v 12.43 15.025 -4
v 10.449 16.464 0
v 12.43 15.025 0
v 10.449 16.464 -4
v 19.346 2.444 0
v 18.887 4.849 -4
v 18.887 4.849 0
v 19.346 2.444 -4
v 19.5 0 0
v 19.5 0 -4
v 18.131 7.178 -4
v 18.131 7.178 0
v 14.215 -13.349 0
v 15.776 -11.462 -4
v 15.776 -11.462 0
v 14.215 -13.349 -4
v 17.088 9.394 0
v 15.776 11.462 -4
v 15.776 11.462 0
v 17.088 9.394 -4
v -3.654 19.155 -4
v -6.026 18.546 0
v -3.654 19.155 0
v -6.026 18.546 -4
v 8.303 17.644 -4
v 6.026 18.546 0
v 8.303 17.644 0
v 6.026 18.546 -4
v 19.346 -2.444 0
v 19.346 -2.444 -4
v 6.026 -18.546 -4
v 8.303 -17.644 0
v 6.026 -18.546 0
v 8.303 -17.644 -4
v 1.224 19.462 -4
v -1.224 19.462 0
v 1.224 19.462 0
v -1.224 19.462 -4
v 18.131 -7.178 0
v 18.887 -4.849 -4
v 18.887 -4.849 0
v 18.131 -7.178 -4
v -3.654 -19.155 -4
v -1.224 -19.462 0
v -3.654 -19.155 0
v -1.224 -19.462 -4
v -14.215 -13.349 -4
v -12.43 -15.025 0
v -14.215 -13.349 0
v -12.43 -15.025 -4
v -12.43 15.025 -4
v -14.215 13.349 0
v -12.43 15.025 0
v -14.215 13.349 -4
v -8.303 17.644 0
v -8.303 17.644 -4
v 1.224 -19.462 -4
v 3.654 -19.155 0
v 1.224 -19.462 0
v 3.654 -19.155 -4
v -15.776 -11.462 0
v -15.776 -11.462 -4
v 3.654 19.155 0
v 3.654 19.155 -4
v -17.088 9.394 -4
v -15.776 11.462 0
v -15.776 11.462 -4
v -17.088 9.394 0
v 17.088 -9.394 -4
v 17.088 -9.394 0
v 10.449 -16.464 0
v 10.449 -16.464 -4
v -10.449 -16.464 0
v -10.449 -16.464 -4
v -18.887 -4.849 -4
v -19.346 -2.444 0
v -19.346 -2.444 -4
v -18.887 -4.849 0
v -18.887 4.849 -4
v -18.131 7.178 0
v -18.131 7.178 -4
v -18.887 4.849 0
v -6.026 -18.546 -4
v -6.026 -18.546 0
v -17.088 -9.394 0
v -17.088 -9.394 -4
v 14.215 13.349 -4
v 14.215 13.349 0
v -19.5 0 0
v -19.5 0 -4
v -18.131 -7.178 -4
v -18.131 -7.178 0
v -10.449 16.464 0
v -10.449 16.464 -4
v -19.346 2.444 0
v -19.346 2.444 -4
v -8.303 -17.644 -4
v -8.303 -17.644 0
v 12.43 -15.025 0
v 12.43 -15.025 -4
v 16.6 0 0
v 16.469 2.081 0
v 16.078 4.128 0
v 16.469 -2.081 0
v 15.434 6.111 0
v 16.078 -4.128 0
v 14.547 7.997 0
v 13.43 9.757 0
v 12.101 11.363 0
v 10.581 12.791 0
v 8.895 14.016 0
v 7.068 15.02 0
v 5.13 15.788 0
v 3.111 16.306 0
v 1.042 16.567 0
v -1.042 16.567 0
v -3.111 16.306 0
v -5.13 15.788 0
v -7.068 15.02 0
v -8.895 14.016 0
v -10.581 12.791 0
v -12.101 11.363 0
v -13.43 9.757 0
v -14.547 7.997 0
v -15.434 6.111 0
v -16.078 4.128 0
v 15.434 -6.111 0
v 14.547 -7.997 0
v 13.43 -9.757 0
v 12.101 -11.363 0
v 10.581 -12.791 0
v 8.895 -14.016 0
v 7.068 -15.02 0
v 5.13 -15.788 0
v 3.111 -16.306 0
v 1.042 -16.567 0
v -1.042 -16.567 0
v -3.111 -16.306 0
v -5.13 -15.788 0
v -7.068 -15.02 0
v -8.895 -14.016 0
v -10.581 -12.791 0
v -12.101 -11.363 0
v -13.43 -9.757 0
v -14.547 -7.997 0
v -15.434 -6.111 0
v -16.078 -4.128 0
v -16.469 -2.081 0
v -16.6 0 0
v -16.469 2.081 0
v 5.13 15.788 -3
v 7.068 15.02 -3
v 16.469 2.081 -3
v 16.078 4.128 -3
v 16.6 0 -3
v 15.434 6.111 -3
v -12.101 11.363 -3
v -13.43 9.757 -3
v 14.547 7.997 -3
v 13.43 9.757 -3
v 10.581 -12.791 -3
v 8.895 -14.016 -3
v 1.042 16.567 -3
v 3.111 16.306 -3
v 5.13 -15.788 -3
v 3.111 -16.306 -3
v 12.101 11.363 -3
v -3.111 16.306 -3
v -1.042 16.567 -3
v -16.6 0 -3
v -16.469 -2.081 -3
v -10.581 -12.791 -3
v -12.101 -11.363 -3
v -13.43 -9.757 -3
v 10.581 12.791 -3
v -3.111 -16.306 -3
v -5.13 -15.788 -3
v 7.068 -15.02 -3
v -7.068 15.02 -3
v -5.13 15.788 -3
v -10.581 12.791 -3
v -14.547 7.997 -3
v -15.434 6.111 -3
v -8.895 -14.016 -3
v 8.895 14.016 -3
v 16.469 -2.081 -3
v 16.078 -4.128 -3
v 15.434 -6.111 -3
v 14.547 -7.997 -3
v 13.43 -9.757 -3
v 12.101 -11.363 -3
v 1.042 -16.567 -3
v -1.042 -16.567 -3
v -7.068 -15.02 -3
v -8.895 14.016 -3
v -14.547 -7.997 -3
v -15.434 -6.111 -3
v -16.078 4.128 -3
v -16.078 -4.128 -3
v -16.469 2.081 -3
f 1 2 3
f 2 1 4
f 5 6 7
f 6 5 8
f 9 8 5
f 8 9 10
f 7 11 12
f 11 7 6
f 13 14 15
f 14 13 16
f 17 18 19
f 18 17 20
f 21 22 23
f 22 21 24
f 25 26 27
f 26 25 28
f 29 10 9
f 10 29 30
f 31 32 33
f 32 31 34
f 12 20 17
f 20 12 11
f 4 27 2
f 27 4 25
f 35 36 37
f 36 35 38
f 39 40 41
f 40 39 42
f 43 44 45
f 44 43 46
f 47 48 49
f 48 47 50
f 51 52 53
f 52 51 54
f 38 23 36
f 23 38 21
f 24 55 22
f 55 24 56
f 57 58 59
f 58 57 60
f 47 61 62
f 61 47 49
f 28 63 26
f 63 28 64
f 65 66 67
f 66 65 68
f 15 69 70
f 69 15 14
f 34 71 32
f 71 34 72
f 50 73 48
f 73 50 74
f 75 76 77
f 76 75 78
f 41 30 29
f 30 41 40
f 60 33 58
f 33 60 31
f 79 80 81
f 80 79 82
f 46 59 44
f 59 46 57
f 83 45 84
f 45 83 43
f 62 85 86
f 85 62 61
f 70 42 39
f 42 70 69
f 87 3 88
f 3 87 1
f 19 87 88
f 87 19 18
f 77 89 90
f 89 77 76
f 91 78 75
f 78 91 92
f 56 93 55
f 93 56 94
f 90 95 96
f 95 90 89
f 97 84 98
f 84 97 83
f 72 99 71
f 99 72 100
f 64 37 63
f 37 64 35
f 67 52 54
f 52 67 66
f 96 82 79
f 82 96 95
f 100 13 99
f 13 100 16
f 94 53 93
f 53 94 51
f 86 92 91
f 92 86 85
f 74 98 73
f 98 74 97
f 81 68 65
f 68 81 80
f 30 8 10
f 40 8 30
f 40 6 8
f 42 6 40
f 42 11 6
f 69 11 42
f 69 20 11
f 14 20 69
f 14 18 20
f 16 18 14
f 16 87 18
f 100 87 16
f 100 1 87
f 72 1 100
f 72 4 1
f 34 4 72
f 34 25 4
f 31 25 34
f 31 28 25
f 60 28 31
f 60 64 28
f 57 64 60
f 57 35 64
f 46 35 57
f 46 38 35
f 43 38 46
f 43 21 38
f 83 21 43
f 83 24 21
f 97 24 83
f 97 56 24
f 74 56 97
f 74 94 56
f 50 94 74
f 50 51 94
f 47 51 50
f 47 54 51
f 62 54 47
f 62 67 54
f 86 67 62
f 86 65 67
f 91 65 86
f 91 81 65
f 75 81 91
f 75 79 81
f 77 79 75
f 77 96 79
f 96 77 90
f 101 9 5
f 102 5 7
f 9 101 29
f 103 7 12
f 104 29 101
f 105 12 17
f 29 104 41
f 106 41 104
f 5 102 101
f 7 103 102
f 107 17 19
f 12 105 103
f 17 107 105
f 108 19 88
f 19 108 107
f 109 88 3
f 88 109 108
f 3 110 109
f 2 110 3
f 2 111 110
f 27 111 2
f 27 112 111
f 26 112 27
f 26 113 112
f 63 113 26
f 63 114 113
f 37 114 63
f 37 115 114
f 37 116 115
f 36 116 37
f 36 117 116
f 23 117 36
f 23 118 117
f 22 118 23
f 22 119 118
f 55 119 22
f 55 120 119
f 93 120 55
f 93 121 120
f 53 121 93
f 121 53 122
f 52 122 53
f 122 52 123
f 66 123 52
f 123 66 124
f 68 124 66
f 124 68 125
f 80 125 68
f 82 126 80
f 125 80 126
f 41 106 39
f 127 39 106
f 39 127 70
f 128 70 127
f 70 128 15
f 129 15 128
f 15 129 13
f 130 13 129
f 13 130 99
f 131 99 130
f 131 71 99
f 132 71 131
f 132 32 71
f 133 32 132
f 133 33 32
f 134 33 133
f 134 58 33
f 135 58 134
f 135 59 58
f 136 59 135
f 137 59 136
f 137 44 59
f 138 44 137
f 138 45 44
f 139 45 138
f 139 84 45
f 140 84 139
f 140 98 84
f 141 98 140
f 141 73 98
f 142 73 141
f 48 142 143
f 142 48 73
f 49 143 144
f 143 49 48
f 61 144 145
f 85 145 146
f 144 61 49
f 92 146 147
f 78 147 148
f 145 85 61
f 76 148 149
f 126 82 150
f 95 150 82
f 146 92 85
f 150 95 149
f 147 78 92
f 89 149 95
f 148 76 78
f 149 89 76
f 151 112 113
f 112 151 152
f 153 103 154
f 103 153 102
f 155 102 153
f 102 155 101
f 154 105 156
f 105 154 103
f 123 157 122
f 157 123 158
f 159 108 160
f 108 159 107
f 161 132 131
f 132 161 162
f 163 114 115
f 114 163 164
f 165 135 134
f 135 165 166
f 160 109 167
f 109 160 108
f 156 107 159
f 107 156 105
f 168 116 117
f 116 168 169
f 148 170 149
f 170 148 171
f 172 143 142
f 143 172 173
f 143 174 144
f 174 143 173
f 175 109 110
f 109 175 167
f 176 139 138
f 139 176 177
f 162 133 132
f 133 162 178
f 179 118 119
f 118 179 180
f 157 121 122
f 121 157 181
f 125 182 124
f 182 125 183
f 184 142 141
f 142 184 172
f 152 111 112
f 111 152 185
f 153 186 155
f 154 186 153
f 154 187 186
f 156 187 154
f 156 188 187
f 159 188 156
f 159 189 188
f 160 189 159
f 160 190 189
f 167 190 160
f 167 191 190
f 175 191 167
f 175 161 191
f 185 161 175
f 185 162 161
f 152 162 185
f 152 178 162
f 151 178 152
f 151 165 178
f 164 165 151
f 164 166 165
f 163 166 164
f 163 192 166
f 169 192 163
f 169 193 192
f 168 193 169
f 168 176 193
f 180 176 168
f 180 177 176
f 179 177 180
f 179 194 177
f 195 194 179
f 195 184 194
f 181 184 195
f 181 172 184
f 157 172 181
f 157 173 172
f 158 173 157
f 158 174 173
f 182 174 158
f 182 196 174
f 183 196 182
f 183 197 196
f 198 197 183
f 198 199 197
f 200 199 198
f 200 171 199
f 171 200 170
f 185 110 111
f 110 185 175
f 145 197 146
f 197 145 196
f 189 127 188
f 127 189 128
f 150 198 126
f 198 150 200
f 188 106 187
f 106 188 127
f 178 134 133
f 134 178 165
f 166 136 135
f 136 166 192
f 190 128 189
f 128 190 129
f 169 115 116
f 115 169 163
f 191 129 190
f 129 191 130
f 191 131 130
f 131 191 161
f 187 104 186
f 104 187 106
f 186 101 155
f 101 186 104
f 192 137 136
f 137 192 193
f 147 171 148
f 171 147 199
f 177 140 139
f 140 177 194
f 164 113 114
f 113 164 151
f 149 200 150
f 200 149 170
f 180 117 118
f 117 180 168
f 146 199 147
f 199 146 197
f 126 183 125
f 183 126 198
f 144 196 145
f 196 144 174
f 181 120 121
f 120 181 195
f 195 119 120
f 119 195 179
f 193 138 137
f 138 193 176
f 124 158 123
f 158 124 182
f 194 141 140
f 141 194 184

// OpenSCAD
$fn = 50;


difference() {
	union() {
		translate(v = [0, 0, -4.0000000000]) {
			cylinder(h = 4, r = 19.5000000000);
		}
	}
	union() {
		#translate(v = [0, 0, -3.0000000000]) {
			cylinder(h = 3, r = 16.6000000000);
		}
	}
}
